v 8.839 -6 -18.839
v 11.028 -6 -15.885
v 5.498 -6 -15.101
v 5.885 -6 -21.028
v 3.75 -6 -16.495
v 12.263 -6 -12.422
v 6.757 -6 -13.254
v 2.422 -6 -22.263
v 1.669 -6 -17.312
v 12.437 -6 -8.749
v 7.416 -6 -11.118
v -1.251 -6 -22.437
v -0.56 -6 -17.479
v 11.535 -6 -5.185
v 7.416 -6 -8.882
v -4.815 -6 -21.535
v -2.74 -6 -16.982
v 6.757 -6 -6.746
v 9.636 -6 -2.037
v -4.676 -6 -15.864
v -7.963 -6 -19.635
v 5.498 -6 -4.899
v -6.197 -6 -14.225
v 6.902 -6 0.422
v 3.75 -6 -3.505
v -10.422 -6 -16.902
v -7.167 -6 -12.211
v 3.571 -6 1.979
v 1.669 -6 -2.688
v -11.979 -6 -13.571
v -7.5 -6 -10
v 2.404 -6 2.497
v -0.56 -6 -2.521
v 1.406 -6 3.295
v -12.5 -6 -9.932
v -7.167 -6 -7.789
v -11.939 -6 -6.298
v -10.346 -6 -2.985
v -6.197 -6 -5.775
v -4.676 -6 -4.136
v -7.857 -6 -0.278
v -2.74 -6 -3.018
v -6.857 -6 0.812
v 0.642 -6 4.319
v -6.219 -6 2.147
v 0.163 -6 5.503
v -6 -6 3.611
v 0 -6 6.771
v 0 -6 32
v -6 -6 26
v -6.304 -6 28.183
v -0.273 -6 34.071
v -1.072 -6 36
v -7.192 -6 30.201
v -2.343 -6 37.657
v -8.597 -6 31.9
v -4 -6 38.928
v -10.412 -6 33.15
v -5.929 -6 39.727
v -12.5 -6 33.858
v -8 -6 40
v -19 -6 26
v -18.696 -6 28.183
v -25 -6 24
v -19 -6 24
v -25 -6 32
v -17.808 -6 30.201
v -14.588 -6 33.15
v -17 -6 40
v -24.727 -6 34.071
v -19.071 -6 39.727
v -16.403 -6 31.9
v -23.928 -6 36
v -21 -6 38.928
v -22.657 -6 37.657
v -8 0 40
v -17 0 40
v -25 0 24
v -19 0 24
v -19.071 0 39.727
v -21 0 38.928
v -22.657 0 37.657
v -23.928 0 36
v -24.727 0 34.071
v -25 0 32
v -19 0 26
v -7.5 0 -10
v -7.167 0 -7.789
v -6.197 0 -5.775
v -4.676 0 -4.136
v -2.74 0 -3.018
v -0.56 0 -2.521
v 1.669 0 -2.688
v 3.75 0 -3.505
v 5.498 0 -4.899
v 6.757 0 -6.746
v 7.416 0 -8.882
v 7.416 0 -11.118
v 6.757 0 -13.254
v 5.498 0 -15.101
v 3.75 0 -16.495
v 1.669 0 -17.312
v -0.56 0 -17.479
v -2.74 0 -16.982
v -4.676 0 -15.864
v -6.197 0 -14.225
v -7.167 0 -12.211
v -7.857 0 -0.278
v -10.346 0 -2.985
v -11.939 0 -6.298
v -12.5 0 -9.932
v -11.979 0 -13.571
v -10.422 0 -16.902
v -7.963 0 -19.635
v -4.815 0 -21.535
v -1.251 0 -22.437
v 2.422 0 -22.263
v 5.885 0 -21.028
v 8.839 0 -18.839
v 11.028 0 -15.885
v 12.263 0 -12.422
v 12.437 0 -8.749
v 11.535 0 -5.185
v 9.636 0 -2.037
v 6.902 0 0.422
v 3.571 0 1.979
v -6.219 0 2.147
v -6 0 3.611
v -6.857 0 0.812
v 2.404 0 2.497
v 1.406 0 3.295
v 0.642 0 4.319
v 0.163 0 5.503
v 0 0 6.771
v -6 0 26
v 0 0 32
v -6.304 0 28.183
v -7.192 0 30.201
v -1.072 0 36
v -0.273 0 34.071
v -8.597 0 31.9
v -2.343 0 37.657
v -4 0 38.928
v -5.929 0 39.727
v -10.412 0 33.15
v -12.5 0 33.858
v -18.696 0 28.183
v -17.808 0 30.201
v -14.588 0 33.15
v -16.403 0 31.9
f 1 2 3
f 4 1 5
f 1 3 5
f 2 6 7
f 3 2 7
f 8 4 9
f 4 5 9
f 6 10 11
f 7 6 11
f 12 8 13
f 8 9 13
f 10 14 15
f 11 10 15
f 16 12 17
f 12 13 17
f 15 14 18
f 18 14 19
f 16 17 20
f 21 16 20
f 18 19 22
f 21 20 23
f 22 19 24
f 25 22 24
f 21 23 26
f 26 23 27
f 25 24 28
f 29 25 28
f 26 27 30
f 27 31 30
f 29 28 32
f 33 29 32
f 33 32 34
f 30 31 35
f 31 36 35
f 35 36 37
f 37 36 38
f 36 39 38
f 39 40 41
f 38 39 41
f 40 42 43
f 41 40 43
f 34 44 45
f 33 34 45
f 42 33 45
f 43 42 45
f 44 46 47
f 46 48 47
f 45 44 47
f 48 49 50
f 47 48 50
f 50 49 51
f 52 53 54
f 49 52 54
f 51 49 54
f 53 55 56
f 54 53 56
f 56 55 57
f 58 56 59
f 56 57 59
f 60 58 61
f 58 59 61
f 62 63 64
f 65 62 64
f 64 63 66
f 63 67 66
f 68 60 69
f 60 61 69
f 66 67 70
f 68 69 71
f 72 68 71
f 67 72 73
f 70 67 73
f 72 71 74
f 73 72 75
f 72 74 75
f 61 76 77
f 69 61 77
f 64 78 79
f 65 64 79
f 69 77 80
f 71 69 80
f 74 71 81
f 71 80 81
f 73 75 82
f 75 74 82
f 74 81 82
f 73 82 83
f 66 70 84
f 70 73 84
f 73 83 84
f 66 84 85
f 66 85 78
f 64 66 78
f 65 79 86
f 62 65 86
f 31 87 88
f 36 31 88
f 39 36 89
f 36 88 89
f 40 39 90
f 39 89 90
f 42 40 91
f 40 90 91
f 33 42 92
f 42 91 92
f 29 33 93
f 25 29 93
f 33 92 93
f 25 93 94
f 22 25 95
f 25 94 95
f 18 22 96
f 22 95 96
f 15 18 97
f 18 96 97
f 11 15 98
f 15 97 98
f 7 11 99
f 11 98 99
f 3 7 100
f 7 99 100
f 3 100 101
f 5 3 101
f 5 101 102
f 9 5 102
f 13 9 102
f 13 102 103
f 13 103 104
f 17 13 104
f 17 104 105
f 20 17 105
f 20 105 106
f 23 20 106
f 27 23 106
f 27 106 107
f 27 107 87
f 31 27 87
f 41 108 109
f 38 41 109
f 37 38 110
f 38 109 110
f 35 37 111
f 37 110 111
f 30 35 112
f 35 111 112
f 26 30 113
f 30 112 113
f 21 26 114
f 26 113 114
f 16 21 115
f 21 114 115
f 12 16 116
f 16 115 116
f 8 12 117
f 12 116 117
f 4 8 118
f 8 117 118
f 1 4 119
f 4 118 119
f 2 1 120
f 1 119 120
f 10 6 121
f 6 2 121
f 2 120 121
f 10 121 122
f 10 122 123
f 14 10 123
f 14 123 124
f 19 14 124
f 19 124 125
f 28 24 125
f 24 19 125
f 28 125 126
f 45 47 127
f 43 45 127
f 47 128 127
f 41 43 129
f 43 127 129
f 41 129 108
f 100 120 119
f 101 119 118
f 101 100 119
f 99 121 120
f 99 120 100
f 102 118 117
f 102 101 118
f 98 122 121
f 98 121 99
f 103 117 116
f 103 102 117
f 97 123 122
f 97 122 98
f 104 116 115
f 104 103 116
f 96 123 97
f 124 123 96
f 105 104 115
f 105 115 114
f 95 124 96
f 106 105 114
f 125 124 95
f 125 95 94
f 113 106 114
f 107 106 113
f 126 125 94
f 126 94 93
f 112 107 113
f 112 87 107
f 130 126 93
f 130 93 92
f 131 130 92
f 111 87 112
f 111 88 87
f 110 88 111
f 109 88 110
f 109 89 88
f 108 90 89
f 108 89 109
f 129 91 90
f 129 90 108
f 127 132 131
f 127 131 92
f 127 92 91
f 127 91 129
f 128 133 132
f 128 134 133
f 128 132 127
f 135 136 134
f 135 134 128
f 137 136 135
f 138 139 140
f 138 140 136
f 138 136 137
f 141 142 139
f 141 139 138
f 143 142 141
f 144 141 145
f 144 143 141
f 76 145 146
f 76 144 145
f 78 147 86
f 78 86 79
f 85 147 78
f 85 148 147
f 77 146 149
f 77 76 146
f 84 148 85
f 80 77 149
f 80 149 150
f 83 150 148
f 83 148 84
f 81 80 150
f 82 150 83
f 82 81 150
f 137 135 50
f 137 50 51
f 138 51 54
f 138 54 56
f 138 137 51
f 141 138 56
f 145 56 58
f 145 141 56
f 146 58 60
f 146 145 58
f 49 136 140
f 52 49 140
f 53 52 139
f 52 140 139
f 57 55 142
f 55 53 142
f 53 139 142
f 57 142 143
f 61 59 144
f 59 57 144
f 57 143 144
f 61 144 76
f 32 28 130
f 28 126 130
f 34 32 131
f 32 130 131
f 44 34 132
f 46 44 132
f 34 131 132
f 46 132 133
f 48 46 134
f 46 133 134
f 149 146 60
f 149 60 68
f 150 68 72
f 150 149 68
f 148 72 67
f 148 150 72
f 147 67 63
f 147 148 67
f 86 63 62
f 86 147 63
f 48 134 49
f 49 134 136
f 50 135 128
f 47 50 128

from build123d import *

# Parameters (mm, degrees)
F1_DEPTH    = 6
F2_R        = 12.5
F3_DEPTH    = 6
F5_D        = 15
F6_T1_DEPTH = 6
F6_T3_DEPTH = 46
F7_R        = 5


# Not quite as in the source:
# - a fillet or chamfer that OpenCascade refuses, or shapes differently, is made with other operations: its cross-section is extruded or revolved along the edge and cut away or added


with BuildPart() as f1:
    # F0 (on Front) → F1 (new body)
    with BuildSketch(Plane.XZ):
        Polygon((0, 0), (0, 40), (-25, 40), (-25, 24), (-19, 24), (-19, 34), (-6, 34), (-6, 0), align=None)
    extrude(amount=F1_DEPTH)

    # F2 (on Front) → F3 (join)
    with BuildSketch(Plane.XZ):
        with Locations((0, -10)):
            Circle(F2_R)
    extrude(amount=F3_DEPTH)

    # F5 (through all)
    with Locations(Plane.XZ.offset(6)):
        with Locations((0, -10)):
            Hole(F5_D / 2)

    # F6: fillet of radius 8 on 4 edges, made by hand

    # F6_s2 → F6_t1 (join)
    with BuildSketch(Plane.XZ):
        with BuildLine():
            ThreePointArc((-6, 26), (-8.3431457505, 31.6568542495), (-14, 34))
            Line((-14, 34), (-6, 34))
            Line((-6, 34), (-6, 26))
        make_face()
        with BuildLine():
            ThreePointArc((-11, 34), (-16.6568542495, 31.6568542495), (-19, 26))
            Line((-19, 26), (-19, 34))
            Line((-19, 34), (-11, 34))
        make_face()
    extrude(amount=F6_T1_DEPTH)

    # F6_s4 → F6_t3 (cut)
    with BuildSketch(Plane.XZ.offset(-20)):
        with BuildLine():
            ThreePointArc((0, 32), (-2.3431457505, 37.6568542495), (-8, 40))
            Line((-8, 40), (0, 40))
            Line((0, 40), (0, 32))
        make_face()
        with BuildLine():
            ThreePointArc((-17, 40), (-22.6568542495, 37.6568542495), (-25, 32))
            Line((-25, 32), (-25, 40))
            Line((-25, 40), (-17, 40))
        make_face()
    extrude(amount=F6_T3_DEPTH, mode=Mode.SUBTRACT)

    # F7
    f7_edges = [f1.edges().sort_by_distance(p)[0] for p in [
        (-6, -3, 0.965856),
        (0, -3, 2.5),
    ]]
    fillet(f7_edges, radius=F7_R)


solid = f1.part
